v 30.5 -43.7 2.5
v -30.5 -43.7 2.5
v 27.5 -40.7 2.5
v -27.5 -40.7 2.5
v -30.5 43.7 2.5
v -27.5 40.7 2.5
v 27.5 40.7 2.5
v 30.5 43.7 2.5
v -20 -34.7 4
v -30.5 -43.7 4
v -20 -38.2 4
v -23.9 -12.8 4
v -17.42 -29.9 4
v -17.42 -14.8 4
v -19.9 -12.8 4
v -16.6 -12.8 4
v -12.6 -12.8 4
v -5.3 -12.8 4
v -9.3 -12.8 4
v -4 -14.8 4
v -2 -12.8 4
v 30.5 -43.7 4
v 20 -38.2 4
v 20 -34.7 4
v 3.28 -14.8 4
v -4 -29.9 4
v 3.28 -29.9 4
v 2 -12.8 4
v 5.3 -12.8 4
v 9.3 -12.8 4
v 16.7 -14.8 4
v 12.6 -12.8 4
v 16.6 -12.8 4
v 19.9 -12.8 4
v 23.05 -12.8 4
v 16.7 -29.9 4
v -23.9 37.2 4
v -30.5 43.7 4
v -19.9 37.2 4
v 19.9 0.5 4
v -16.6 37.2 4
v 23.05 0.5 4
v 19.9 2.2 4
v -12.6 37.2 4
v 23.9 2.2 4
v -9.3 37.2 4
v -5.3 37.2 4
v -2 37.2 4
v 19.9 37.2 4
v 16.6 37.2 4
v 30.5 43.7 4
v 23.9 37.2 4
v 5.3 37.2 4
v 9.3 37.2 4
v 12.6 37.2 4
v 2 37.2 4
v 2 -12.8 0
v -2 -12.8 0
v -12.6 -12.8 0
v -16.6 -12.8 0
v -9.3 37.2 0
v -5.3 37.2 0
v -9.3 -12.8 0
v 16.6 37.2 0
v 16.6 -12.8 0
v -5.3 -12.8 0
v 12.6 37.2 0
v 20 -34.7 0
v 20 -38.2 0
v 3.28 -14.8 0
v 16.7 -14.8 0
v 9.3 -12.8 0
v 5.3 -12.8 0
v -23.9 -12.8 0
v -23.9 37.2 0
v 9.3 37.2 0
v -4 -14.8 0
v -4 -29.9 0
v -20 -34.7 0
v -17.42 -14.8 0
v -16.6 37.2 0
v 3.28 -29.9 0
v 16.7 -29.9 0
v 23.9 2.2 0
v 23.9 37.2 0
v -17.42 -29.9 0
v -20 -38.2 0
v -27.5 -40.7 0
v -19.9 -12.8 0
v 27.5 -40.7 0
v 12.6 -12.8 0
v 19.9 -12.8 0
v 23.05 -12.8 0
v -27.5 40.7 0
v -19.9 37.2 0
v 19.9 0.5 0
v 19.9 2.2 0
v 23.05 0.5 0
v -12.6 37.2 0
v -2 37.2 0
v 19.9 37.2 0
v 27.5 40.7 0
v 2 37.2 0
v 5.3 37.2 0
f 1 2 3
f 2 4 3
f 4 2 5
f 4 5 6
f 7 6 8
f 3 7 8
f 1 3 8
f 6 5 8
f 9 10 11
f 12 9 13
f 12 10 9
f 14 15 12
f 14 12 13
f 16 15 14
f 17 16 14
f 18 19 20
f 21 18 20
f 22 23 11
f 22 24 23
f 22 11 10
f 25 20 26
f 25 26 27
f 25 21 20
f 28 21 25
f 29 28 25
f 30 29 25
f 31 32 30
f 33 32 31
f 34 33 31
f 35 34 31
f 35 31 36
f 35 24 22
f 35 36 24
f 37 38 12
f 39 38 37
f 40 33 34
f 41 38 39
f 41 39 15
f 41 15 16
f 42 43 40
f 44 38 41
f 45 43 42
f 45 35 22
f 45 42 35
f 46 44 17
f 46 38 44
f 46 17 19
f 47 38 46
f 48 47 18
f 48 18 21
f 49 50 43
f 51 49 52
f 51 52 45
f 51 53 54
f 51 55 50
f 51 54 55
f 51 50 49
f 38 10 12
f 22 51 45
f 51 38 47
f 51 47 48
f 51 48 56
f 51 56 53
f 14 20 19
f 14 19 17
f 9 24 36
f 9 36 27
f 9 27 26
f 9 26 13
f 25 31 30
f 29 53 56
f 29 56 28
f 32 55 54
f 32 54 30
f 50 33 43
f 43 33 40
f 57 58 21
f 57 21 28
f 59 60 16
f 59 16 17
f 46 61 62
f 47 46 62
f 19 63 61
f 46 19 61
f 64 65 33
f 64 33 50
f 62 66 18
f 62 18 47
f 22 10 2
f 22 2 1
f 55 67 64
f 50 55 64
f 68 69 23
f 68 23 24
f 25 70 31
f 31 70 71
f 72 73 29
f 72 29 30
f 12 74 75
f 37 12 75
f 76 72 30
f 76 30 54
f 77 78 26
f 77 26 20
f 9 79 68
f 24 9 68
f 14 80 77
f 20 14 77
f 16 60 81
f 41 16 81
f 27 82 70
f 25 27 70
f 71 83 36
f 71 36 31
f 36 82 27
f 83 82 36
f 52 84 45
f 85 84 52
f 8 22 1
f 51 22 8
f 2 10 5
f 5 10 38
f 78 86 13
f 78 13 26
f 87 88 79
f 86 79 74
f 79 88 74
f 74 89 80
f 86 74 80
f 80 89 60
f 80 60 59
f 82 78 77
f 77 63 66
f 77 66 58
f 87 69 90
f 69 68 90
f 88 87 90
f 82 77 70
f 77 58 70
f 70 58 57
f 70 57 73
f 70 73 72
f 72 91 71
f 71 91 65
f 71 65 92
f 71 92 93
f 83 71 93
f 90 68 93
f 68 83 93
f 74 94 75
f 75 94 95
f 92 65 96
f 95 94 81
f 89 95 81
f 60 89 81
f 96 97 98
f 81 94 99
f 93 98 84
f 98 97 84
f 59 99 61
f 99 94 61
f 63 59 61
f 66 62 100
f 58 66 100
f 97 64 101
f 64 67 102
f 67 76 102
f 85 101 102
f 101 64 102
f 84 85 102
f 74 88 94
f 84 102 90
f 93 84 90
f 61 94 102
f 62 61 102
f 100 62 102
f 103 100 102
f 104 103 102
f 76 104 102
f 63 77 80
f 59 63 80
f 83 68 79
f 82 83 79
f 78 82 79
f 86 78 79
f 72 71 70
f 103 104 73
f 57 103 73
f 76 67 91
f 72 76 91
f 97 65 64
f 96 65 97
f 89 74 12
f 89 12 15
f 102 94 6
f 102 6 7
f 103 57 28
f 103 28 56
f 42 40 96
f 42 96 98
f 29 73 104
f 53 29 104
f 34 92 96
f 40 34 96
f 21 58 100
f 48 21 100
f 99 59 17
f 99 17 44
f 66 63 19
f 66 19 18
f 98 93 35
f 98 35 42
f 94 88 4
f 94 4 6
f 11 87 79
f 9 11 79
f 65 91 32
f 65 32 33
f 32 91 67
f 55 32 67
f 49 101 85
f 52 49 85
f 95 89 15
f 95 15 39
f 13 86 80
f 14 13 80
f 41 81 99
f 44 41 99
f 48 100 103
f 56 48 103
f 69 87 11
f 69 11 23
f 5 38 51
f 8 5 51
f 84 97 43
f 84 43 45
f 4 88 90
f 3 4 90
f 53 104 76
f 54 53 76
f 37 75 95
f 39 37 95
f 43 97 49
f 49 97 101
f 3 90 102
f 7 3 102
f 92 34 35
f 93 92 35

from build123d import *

# Parameters (mm, degrees)
SKETCH_W      = 55
SKETCH_H      = 81.4
SKETCH_W_2    = 4
SKETCH_H_2    = 50
SKETCH_H_3    = 35
SKETCH_W_3    = 3.15
SKETCH_H_4    = 13.3
SKETCH_W_4    = 13.42
SKETCH_H_5    = 15.1
SKETCH_W_5    = 40
SKETCH_H_6    = 3.5
PAD_DEPTH     = 4
SKETCH001_W   = 61
SKETCH001_H   = 87.4
SKETCH001_W_2 = 55
SKETCH001_H_2 = 81.4
PAD001_DEPTH  = 1.5


with BuildPart() as part:
    # Sketch → Pad (new body)
    with BuildSketch(Plane.XY):
        Rectangle(SKETCH_W, SKETCH_H)
        with Locations((-21.9, 12.2)):
            Rectangle(SKETCH_W_2, SKETCH_H_2, mode=Mode.SUBTRACT)
        with Locations((-14.6, 12.2)):
            Rectangle(SKETCH_W_2, SKETCH_H_2, mode=Mode.SUBTRACT)
        with Locations((-7.3, 12.2)):
            Rectangle(SKETCH_W_2, SKETCH_H_2, mode=Mode.SUBTRACT)
        with Locations((0, 12.2)):
            Rectangle(SKETCH_W_2, SKETCH_H_2, mode=Mode.SUBTRACT)
        with Locations((7.3, 12.2)):
            Rectangle(SKETCH_W_2, SKETCH_H_2, mode=Mode.SUBTRACT)
        with Locations((14.6, 12.2)):
            Rectangle(SKETCH_W_2, SKETCH_H_2, mode=Mode.SUBTRACT)
        with Locations((21.9, 19.7)):
            Rectangle(SKETCH_W_2, SKETCH_H_3, mode=Mode.SUBTRACT)
        with Locations((21.475, -6.15)):
            Rectangle(SKETCH_W_3, SKETCH_H_4, mode=Mode.SUBTRACT)
        with Locations((-10.71, -22.35)):
            Rectangle(SKETCH_W_4, SKETCH_H_5, mode=Mode.SUBTRACT)
        with Locations((9.99, -22.35)):
            Rectangle(SKETCH_W_4, SKETCH_H_5, mode=Mode.SUBTRACT)
        with Locations((0, -36.45)):
            Rectangle(SKETCH_W_5, SKETCH_H_6, mode=Mode.SUBTRACT)
    extrude(amount=PAD_DEPTH)

    # Sketch001 → Pad001 (new body)
    with BuildSketch(Plane.XY.offset(4)):
        Rectangle(SKETCH001_W, SKETCH001_H)
        Rectangle(SKETCH001_W_2, SKETCH001_H_2, mode=Mode.SUBTRACT)
    extrude(amount=-PAD001_DEPTH)


solid = part.part
